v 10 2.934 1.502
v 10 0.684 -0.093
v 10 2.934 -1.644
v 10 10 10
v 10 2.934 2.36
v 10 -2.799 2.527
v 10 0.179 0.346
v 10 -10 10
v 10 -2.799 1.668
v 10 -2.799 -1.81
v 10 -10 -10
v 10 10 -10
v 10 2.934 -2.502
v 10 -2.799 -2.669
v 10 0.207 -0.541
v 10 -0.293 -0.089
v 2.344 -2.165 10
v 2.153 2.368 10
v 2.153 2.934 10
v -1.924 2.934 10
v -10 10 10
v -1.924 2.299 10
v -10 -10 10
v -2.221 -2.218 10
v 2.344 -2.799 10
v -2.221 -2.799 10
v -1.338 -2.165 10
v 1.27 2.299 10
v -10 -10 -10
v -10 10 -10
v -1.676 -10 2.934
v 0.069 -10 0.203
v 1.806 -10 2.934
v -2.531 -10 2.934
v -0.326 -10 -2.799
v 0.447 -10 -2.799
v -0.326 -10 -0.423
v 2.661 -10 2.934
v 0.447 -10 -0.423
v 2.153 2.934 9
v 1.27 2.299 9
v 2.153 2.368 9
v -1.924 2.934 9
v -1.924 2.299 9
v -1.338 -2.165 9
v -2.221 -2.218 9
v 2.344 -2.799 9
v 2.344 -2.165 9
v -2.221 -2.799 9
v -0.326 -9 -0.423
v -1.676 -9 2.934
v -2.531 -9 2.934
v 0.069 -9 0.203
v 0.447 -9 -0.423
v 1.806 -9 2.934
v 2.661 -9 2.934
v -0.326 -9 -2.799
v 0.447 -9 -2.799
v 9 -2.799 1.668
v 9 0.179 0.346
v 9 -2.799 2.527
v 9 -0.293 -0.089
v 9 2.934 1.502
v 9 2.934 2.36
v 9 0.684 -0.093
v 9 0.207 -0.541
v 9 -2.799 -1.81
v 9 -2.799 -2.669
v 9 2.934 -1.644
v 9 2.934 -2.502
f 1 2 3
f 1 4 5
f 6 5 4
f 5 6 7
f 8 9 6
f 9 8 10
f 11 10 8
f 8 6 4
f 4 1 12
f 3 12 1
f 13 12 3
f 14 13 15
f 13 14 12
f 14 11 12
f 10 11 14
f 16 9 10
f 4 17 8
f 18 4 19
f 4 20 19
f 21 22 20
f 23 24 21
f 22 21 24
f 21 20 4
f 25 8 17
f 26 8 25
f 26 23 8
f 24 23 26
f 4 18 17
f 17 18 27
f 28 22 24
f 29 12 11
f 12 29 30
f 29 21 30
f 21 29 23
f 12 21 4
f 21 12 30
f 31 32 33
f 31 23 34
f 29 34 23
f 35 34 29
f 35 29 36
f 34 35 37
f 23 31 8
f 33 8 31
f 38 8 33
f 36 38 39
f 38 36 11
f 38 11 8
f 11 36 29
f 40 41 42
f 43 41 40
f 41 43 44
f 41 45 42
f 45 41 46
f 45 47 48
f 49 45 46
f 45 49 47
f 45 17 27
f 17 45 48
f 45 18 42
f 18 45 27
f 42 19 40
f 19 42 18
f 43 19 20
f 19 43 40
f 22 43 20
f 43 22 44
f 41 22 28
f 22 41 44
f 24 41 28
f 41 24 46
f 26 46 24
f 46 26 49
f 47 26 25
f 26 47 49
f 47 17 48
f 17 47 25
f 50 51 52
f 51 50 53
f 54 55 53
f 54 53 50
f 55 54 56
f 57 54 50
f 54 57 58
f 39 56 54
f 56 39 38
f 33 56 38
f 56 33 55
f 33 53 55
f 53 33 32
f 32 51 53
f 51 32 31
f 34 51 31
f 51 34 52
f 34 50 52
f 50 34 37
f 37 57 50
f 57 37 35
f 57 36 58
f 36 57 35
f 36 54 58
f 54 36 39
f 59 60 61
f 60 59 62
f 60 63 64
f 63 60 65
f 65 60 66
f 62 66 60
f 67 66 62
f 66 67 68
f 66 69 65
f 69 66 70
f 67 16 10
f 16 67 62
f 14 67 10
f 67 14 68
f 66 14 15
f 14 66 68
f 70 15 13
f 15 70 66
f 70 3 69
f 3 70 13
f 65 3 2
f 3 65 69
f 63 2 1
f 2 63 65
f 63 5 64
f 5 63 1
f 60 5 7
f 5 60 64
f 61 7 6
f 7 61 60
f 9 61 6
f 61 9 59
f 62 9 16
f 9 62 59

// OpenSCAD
/* 20 mm calibration cube with embossed axes */
size=20;
difference(){
  cube([size,size,size], center=true);
  translate([0,0,size/2-1]) linear_extrude(1) text("Z", size=6, halign="center", valign="center");
  rotate([90,0,0]) translate([0,0,size/2-1]) linear_extrude(1) text("Y", size=6, halign="center", valign="center");
  rotate([0,90,0]) translate([0,0,size/2-1]) linear_extrude(1) text("X", size=6, halign="center", valign="center");
}
